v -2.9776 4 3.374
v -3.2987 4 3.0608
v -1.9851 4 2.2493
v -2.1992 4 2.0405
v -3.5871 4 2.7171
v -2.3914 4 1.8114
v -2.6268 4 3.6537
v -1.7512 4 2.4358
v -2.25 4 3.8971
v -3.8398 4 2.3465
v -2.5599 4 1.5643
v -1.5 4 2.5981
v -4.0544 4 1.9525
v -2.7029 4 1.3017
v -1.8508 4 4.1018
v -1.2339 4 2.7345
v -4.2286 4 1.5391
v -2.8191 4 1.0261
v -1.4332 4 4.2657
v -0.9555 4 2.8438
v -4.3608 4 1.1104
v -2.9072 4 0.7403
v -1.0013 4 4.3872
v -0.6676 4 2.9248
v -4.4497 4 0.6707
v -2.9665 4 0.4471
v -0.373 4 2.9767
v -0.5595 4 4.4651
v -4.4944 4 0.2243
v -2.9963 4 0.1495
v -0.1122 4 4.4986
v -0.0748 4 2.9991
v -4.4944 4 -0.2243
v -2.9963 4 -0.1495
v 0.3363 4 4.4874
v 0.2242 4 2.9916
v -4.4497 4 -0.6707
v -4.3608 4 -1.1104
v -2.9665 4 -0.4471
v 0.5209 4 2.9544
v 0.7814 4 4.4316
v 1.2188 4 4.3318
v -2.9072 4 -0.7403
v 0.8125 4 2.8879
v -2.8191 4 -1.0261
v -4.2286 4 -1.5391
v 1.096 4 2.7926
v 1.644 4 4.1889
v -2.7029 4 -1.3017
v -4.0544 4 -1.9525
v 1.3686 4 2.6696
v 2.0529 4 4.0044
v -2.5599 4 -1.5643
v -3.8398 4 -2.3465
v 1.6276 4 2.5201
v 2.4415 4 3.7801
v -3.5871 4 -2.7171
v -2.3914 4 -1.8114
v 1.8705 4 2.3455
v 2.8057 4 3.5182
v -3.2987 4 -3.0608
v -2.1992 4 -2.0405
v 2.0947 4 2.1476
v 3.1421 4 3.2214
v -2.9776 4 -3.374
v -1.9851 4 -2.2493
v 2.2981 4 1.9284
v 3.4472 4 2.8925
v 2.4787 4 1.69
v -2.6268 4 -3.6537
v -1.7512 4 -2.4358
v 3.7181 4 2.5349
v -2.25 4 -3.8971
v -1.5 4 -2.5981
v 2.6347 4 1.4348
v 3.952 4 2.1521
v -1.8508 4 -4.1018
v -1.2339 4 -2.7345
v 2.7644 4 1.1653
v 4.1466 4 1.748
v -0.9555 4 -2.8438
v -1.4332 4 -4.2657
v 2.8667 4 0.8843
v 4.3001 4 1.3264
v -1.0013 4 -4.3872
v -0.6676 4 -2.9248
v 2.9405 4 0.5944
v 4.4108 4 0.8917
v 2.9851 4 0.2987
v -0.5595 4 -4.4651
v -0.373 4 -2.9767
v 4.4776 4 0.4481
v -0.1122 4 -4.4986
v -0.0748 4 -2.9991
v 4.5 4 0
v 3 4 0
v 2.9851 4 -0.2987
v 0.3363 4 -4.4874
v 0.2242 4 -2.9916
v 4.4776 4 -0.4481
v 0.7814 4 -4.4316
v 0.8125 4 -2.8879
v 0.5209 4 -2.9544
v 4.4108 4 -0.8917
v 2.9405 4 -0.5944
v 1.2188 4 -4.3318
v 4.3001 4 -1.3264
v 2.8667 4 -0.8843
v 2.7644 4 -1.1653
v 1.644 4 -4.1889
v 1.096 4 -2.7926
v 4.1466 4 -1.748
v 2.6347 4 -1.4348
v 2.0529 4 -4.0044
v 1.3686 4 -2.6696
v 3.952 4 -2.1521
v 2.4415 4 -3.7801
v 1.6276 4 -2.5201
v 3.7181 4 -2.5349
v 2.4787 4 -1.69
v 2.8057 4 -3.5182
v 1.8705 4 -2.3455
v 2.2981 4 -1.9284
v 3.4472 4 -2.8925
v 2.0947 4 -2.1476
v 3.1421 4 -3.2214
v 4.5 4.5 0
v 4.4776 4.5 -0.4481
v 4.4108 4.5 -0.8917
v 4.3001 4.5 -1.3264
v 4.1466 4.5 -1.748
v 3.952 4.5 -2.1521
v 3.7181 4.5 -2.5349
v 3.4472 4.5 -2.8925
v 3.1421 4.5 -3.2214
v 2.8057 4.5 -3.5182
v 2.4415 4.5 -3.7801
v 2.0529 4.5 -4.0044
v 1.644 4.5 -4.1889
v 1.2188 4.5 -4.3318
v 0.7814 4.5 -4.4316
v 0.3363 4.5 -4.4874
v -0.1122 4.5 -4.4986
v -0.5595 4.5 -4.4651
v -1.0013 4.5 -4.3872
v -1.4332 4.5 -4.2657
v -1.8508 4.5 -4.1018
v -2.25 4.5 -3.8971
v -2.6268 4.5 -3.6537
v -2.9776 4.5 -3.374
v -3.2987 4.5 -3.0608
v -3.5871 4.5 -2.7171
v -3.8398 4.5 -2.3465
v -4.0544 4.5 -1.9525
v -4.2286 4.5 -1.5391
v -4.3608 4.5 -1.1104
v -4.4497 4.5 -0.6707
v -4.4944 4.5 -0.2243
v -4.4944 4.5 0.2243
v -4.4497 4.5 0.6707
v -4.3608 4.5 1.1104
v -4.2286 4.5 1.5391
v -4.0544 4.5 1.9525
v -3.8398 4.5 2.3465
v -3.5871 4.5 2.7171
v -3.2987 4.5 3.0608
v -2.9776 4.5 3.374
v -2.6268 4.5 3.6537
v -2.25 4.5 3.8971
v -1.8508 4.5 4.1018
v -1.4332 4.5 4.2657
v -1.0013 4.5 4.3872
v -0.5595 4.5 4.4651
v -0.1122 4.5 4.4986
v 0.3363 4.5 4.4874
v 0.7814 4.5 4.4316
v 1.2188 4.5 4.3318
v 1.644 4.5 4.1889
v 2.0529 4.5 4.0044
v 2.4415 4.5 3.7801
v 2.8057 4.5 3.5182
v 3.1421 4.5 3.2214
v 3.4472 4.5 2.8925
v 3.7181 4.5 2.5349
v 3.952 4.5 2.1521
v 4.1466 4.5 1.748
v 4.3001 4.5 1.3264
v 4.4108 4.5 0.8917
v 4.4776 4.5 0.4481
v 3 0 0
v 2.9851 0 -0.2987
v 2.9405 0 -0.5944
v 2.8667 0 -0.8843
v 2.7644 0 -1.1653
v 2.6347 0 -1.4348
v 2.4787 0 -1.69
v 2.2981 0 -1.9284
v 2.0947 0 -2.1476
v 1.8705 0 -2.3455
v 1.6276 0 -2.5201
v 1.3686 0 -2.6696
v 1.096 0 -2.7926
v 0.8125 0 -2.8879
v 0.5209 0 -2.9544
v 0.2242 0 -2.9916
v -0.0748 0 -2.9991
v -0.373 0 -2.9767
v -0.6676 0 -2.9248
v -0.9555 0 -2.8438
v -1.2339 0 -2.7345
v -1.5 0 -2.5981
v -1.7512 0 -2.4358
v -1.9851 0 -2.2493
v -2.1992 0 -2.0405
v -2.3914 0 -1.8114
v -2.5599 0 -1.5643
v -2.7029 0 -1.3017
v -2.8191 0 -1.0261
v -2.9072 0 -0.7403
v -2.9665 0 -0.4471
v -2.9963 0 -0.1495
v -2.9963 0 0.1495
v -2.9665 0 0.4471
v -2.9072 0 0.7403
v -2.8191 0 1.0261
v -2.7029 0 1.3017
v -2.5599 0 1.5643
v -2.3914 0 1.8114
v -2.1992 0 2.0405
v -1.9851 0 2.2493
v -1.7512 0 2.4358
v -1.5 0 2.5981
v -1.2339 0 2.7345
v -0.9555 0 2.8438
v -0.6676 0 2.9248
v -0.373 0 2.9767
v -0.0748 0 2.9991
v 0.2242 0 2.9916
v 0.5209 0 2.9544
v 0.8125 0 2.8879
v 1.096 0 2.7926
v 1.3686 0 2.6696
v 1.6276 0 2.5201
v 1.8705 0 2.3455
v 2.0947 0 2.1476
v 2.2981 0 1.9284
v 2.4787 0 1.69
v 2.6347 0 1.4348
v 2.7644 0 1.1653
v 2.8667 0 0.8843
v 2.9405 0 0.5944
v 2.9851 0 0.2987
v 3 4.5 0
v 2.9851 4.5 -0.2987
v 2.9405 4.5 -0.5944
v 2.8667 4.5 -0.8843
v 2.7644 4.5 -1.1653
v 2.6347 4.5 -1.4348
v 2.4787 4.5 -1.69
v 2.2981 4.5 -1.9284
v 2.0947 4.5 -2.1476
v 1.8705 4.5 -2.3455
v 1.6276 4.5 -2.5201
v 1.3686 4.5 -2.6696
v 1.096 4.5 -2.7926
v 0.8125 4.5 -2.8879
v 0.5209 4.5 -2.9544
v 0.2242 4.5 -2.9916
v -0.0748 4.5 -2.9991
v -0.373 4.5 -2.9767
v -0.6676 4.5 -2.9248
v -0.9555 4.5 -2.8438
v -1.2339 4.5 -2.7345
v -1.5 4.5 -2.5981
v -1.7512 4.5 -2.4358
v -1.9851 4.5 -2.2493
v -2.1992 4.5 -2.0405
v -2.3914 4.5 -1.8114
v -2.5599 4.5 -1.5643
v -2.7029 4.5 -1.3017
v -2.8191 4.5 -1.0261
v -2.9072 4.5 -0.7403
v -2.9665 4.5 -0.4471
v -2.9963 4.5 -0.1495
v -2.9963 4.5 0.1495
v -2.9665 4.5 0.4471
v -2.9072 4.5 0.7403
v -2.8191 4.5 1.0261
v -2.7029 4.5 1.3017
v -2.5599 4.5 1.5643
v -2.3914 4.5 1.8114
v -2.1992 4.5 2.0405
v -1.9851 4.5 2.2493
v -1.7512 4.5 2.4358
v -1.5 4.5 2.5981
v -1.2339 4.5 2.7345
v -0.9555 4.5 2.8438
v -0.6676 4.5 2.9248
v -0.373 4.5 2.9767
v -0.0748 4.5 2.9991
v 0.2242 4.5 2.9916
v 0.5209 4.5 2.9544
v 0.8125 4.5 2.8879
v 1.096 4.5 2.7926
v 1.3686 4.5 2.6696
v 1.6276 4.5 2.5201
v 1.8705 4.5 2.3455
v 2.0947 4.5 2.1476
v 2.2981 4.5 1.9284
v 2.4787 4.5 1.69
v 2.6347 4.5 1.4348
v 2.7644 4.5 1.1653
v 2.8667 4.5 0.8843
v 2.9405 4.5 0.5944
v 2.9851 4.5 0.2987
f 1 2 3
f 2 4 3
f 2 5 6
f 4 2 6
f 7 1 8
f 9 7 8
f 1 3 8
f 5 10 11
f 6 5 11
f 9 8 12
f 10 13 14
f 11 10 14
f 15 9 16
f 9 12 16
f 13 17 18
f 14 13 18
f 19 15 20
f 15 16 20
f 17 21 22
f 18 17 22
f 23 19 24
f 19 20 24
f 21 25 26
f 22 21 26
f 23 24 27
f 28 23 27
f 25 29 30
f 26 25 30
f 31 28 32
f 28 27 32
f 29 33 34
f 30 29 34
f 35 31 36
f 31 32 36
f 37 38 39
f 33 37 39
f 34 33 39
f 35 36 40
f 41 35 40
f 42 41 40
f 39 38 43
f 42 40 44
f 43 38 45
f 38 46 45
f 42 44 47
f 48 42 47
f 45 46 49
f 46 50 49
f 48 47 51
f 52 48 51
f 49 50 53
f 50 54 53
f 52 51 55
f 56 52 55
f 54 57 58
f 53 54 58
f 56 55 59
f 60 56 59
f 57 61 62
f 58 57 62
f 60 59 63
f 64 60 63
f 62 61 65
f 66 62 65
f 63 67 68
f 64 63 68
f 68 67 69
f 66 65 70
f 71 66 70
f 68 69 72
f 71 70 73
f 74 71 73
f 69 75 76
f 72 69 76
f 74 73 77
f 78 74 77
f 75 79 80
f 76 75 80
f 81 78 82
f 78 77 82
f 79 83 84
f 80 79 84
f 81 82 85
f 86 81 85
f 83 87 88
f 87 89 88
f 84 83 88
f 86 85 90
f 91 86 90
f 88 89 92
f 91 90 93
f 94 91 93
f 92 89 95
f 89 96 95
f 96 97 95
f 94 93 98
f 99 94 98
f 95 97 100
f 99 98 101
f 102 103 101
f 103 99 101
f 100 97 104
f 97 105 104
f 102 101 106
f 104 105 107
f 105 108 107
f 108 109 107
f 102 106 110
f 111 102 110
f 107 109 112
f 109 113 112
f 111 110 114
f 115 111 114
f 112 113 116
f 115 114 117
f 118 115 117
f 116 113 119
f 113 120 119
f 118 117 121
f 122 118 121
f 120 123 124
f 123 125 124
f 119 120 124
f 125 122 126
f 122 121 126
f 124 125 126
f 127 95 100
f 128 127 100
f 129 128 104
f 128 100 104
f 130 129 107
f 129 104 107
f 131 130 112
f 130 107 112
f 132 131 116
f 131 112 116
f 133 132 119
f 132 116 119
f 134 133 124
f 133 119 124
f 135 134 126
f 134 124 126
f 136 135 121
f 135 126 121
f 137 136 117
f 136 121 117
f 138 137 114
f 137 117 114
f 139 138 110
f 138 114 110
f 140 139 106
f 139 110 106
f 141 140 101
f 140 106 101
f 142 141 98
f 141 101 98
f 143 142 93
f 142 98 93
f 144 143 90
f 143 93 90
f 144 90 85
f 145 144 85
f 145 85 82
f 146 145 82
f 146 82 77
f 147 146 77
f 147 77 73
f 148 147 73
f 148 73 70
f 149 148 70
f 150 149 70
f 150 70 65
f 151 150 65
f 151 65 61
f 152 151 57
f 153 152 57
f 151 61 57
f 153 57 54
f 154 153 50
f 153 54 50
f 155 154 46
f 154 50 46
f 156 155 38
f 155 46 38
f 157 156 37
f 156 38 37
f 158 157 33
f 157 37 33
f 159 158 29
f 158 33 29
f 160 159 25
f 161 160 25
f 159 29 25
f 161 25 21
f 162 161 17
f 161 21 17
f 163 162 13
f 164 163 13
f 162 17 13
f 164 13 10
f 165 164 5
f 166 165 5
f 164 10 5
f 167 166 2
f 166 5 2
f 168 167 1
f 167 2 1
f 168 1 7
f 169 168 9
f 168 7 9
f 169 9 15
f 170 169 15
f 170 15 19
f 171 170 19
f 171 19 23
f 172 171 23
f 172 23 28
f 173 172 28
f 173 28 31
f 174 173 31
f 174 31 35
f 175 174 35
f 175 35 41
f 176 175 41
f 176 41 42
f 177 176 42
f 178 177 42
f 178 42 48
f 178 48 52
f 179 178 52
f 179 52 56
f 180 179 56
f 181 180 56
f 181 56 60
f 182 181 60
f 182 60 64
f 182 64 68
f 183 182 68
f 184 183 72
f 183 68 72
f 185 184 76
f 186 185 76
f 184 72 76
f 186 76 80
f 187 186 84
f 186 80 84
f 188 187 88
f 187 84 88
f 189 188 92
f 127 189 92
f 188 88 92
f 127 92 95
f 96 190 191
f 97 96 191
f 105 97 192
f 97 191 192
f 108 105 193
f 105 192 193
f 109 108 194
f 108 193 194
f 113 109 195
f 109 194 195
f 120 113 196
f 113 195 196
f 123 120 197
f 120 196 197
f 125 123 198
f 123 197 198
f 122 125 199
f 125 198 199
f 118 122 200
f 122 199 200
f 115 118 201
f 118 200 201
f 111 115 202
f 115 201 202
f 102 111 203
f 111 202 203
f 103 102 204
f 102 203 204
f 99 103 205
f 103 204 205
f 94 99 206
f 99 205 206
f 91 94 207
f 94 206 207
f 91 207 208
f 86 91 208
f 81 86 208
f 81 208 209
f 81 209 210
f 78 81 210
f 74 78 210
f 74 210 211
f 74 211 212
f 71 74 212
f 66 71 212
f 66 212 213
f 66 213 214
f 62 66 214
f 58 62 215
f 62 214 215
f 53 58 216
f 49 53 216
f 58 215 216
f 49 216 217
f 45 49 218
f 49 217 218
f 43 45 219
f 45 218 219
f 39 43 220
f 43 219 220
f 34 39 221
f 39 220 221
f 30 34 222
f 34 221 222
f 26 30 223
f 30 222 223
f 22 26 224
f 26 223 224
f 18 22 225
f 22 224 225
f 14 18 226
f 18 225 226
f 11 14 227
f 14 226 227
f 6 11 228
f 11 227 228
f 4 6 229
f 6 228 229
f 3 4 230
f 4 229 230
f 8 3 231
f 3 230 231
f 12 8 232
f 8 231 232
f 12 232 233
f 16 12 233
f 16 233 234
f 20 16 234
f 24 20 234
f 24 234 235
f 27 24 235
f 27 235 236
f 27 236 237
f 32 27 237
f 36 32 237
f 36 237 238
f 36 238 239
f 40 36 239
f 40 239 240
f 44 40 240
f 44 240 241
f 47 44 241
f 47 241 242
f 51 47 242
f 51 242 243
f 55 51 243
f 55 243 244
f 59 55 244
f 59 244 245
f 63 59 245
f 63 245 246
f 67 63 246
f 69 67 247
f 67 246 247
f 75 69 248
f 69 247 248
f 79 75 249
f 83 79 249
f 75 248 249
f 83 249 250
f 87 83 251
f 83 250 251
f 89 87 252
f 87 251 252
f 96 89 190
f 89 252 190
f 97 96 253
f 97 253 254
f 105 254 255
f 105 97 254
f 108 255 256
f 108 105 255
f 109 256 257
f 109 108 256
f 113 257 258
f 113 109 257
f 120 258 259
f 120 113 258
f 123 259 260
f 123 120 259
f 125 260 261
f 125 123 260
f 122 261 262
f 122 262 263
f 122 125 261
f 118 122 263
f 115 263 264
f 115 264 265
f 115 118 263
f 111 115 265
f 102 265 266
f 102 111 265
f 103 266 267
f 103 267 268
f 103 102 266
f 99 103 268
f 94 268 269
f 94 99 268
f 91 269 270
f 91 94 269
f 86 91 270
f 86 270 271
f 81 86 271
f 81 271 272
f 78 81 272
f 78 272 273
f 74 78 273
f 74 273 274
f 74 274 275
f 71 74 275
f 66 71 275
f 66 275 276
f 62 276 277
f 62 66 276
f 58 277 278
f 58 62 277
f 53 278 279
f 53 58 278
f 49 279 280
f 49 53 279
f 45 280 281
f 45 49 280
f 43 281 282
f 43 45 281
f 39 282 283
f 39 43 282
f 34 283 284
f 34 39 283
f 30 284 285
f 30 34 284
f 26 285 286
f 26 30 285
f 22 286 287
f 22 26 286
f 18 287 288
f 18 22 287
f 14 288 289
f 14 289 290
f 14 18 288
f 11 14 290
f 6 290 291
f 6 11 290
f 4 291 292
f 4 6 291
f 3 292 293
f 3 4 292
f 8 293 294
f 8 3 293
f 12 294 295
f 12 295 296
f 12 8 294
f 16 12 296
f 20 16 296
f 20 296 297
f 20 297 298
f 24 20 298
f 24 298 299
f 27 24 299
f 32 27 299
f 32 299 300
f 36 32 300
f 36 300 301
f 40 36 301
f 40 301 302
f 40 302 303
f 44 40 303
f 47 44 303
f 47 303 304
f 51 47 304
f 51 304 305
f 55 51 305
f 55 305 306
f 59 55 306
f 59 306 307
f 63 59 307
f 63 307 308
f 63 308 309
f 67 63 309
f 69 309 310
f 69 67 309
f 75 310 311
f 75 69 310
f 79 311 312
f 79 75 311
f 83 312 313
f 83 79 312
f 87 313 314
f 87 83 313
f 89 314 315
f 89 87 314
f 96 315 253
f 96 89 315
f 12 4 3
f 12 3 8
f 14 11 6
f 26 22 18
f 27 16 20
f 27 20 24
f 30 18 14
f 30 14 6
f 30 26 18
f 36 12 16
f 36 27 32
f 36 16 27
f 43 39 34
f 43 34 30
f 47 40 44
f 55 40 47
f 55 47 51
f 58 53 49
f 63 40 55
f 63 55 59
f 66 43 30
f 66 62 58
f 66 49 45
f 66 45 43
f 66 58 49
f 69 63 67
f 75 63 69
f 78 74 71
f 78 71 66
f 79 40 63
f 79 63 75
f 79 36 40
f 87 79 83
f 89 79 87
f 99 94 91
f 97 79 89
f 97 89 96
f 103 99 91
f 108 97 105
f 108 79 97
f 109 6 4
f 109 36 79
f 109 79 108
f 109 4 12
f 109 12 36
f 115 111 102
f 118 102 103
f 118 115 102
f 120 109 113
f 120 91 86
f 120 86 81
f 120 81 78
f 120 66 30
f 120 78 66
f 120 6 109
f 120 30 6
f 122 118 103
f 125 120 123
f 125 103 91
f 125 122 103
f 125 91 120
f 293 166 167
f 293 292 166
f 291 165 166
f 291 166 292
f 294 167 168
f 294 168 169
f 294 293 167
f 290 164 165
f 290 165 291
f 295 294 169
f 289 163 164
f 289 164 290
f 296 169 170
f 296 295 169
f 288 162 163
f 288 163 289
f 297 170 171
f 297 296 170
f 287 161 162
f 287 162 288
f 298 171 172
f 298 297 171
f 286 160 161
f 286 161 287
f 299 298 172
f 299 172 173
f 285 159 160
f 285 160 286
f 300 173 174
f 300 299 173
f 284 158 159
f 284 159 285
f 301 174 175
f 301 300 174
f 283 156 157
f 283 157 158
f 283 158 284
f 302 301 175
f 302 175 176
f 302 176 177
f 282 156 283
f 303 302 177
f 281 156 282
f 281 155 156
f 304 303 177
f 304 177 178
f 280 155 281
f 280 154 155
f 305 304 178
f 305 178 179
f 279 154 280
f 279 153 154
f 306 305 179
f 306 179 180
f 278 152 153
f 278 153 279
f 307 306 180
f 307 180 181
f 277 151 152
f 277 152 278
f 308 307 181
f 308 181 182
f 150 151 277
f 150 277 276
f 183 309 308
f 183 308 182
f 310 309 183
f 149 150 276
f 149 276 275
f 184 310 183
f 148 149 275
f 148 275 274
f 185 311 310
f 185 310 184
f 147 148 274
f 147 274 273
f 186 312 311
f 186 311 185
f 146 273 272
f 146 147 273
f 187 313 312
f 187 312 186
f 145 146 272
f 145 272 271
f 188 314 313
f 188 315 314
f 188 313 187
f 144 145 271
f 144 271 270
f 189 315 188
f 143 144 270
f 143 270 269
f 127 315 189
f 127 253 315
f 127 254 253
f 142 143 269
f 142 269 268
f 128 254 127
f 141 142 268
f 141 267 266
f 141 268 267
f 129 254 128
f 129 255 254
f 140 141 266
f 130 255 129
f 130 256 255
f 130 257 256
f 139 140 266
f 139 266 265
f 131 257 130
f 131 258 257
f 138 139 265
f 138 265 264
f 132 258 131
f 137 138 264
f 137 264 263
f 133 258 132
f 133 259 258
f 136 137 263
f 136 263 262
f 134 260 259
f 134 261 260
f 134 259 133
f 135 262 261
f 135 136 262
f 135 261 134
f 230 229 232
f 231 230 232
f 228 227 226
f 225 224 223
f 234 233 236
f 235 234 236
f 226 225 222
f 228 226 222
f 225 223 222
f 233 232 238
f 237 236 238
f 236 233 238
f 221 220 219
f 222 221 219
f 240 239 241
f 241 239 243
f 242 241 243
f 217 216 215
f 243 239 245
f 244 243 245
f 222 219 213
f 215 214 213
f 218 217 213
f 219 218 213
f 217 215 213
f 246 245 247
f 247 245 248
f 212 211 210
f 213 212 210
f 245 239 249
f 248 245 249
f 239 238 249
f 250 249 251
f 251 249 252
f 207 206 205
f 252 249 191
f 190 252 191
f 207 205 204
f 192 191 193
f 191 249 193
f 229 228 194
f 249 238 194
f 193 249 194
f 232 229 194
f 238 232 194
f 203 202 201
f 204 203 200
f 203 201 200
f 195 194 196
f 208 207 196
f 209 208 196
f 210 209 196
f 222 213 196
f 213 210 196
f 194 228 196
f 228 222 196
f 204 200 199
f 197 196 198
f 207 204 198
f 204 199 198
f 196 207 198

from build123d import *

# Parameters (mm, degrees)
CROQUIS1_R              = 3
SALIENTE_EXTRUIR1_DEPTH = 4
CROQUIS2_R              = 4.5
CROQUIS2_R_2            = 3
SALIENTE_EXTRUIR2_DEPTH = 0.5


with BuildPart() as part:
    # Croquis1 → Saliente-Extruir1 (new body)
    with BuildSketch(Plane(origin=(0, 0, 0), x_dir=(1, 0, 0), z_dir=(0, 1, 0))):
        Circle(CROQUIS1_R)
    extrude(amount=SALIENTE_EXTRUIR1_DEPTH)


with BuildPart() as body_2:
    # Croquis2 → Saliente-Extruir2 (new body)
    with BuildSketch(Plane(origin=(0, 4, 0), x_dir=(1, 0, 0), z_dir=(0, 1, 0))):
        Circle(CROQUIS2_R)
        Circle(CROQUIS2_R_2, mode=Mode.SUBTRACT)
    extrude(amount=SALIENTE_EXTRUIR2_DEPTH)


solid = Compound([part.part, body_2.part])
